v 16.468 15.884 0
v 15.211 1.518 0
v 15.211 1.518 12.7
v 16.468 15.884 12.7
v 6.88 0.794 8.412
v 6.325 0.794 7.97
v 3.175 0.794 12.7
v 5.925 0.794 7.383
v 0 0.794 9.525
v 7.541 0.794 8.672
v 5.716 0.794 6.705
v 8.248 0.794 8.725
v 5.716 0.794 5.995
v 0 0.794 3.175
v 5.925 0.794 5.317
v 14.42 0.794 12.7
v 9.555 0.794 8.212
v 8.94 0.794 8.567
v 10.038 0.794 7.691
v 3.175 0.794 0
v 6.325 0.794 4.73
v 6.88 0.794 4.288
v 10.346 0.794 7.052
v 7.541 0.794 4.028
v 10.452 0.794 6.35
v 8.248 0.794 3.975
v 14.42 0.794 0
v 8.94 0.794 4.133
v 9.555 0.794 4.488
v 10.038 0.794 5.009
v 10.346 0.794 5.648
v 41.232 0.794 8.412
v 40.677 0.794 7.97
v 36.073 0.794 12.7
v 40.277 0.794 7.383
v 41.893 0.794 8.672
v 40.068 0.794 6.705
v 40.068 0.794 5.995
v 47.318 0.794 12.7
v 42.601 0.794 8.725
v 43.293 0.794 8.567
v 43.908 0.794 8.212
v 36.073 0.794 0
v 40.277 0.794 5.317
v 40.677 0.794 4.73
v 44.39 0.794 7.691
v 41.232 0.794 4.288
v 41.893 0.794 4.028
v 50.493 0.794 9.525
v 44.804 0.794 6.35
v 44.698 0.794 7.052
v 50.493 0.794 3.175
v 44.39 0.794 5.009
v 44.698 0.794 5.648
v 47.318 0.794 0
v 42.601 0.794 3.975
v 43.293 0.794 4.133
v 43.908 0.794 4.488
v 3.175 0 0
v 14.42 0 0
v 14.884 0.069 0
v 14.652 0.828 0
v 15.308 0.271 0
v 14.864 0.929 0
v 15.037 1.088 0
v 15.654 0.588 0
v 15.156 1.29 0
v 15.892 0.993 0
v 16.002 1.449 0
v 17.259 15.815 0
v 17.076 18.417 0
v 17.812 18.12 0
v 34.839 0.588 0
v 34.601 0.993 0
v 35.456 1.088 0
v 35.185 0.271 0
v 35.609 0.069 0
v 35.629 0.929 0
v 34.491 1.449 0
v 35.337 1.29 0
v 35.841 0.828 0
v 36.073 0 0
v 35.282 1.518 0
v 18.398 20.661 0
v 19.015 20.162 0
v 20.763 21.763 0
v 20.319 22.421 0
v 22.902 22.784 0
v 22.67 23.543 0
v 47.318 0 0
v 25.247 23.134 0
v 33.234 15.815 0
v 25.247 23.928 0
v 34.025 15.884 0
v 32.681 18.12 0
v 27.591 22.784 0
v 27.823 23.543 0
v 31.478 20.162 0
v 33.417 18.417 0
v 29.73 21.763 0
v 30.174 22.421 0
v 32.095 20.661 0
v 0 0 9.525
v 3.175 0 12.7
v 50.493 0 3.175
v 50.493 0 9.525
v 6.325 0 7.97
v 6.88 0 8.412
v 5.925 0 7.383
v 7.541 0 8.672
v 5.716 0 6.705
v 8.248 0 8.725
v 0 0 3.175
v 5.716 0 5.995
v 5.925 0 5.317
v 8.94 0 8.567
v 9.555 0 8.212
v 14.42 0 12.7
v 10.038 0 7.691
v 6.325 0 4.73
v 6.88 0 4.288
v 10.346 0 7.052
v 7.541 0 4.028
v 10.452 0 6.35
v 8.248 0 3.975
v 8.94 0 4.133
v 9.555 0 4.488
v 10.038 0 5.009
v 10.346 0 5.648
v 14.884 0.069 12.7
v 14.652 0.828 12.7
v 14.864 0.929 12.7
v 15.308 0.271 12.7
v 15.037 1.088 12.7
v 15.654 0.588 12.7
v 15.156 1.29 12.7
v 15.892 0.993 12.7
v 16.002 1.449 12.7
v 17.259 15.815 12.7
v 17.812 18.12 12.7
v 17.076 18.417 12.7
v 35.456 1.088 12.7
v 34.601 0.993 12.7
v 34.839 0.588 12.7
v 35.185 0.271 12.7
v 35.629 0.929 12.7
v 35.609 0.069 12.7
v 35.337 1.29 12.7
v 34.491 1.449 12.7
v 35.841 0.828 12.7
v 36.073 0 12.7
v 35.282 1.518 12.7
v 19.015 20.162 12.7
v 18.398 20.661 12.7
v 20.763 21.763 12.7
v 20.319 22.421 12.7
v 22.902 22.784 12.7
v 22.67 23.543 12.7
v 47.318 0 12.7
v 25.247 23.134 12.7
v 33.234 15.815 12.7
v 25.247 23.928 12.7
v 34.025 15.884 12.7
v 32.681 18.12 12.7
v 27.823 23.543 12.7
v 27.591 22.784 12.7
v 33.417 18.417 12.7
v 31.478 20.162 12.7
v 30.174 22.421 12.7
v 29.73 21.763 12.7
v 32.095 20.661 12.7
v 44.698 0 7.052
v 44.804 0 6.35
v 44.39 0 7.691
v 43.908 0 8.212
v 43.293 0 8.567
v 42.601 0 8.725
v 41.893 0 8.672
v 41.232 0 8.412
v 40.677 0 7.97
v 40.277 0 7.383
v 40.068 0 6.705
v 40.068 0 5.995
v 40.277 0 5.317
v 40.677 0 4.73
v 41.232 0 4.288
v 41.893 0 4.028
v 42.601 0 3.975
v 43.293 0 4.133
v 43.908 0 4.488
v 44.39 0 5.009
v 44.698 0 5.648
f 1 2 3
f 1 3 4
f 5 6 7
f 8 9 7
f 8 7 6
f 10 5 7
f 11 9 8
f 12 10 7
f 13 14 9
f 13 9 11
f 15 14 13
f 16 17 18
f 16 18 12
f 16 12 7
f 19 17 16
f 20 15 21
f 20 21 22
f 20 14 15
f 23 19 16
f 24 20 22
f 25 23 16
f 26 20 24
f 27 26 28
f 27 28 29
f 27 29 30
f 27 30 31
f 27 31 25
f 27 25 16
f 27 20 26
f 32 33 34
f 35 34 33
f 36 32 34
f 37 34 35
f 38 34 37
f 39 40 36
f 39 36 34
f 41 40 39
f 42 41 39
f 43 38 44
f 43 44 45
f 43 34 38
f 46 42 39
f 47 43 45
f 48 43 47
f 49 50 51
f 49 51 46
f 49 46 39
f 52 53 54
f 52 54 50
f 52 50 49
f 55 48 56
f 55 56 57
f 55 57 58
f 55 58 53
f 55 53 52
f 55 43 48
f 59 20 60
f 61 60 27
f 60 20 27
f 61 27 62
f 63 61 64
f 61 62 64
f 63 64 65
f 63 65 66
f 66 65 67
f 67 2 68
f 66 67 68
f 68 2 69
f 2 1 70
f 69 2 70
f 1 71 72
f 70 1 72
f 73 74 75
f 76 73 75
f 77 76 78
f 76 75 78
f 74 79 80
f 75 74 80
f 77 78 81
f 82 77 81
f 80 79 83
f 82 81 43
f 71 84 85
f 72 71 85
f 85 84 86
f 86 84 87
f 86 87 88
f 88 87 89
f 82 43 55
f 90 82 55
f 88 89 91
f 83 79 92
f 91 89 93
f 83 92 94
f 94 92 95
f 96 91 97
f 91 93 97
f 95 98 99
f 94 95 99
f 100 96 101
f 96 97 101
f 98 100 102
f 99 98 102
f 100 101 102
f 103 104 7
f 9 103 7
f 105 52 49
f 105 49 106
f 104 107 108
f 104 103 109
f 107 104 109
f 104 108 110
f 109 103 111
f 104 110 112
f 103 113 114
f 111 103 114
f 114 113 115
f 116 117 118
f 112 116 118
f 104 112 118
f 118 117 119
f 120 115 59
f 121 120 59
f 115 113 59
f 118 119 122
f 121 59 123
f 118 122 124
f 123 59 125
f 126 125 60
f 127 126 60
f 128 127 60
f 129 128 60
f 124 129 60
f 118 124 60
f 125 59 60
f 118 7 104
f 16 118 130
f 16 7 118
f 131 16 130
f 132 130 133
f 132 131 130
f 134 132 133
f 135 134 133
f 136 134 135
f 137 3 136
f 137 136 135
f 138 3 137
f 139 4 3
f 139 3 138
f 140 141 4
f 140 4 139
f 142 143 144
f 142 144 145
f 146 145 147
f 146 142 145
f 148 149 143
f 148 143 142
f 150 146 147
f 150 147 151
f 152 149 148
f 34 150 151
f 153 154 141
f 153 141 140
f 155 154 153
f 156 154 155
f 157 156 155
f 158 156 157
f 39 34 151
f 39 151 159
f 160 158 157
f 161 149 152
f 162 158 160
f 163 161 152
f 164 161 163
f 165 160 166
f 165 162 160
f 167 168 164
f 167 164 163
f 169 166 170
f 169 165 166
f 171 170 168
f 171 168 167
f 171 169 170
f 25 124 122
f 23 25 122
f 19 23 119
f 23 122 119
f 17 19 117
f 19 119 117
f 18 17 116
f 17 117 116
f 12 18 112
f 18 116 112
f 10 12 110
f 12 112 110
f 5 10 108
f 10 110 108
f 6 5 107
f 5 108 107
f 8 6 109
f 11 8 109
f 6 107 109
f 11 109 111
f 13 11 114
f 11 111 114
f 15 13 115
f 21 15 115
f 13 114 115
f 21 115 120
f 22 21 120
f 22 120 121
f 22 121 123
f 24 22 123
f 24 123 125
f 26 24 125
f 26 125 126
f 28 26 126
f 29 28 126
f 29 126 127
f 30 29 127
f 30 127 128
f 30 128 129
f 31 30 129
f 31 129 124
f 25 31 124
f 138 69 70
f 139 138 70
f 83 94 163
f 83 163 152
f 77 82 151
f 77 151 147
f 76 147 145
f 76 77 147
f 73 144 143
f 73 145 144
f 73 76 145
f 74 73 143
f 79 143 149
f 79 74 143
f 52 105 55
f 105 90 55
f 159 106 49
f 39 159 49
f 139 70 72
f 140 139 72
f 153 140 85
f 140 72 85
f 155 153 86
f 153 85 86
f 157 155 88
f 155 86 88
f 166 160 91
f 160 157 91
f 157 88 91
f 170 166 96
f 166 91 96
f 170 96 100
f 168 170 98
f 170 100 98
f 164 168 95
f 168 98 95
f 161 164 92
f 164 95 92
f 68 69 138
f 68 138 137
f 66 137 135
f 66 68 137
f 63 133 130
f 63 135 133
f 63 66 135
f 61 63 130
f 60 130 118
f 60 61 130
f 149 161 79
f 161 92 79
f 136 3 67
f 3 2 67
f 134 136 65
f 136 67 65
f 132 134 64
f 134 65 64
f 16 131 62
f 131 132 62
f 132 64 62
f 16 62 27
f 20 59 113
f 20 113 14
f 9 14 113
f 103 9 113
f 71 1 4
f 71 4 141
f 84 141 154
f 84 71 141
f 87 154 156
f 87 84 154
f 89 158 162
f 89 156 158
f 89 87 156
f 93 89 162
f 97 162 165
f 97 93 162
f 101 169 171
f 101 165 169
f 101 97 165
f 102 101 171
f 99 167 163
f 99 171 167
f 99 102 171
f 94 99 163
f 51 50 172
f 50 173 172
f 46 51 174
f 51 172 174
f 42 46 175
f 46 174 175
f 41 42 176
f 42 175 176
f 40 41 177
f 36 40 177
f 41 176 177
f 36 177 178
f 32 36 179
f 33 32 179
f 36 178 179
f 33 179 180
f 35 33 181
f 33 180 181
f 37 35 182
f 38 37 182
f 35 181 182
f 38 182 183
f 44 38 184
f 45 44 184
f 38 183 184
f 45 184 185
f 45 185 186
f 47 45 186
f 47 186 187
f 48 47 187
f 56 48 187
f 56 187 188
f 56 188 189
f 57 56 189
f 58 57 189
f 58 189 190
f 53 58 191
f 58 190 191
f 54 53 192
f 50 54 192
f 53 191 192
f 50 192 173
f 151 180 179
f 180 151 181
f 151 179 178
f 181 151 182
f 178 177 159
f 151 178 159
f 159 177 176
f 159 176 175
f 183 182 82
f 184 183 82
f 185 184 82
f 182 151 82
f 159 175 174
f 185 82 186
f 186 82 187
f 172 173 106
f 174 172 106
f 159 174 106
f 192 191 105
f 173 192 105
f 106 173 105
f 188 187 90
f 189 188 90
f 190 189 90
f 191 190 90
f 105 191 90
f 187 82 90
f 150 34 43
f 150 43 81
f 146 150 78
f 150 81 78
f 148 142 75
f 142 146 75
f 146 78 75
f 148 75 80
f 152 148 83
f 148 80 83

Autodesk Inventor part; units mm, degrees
ref_plane "YZ Plane" through (0, 0, 0) normal (1, 0, 0) x (0, 1, 0)
ref_plane "XZ Plane" through (0, 0, 0) normal (0, 1, 0) x (-1, 0, 0)
ref_plane "XY Plane" through (0, 0, 0) normal (0, 0, 1) x (1, 0, 0)
sketch "Sketch1" plane through (0, 0, 0) normal (0, 0, 1) x (1, 0, 0)
  line L0 (0, 0) -> (14.4203, 0)
  line L1 (16.0018, 1.4491) -> (17.2586, 15.8146)
  arc A0 (33.2345, 15.8146) -> (17.2586, 15.8146) centre (25.2465, 15.1157) ccw
  line L2 (33.2345, 15.8146) -> (34.4913, 1.4491)
  line L3 (36.0728, 0) -> (50.4931, 0)
  arc A1 (14.4203, 0) -> (16.0018, 1.4491) centre (14.4203, 1.5875) ccw
  arc A2 (34.4913, 1.4491) -> (36.0728, 0) centre (36.0728, 1.5875) ccw
  line L4 (0, 0.7937) -> (14.4203, 0.7937)
  arc A3 (14.4203, 0.7937) -> (15.2111, 1.5183) centre (14.4203, 1.5875) ccw
  line L5 (15.2111, 1.5183) -> (16.4679, 15.8838)
  arc A4 (34.0252, 15.8838) -> (16.4679, 15.8838) centre (25.2465, 15.1157) ccw
  line L6 (34.0252, 15.8838) -> (35.282, 1.5183)
  arc A5 (35.282, 1.5183) -> (36.0728, 0.7938) centre (36.0728, 1.5875) ccw
  line L7 (36.0728, 0.7938) -> (50.4931, 0.7938)
  line L8 (0, 0.7937) -> (0, 0)
  line L9 (50.4931, 0.7938) -> (50.4931, 0)
  line L10 (17.944, 18.4277) -> (32.549, 18.4277) construction
  point P0 (15.875, 0)
  dimension "d0" = 15.875
  dimension "d1" = 15.875
  dimension "d2" = 1.5875
  dimension "d3" = 95
  dimension "d4" = 95
  dimension "d6" = 0.7937
  dimension "d18" = 14.605
  dimension "d19" = 18.4277
extrude "Extrusion1" add sketch "Sketch1" along normal blind 12.7
chamfer "Chamfer1" distance 3.175 angle 45 4 edges at (0, 0.3969, 12.7) (50.4931, 0.3969, 12.7) (50.4931, 0.3969, 0) (0, 0.3969, 0)
sketch "Sketch2" plane through (36.0728, 0, 0) normal (0, -1, 0) x (1, 0, 0)
  line L0 (0, 12.7) -> (11.2453, 12.7) projected
  line L1 (0, 0) -> (0, 12.7) projected
  line L2 (0, 0) -> (11.2453, 0) projected
  line L3 (-32.8978, 0) -> (-36.0728, 3.175) projected
  line L4 (-32.8978, 0) -> (-21.6524, 0) projected
  line L5 (-21.6524, 0) -> (-21.6524, 12.7) projected
  line L6 (-32.8978, 12.7) -> (-21.6524, 12.7) projected
  line L7 (-36.0728, 9.525) -> (-32.8978, 12.7) projected
  line L8 (-36.0728, 3.175) -> (-36.0728, 9.525) projected
  line L9 (6.35, 12.7) -> (6.35, 0) construction
  line L10 (-28.0024, 12.7) -> (-28.0024, 0) construction
  circle A0 centre (-28.0024, 6.35) radius 2.3813
  circle A1 centre (6.35, 6.35) radius 2.3813
  point P0 (-36.0728, 0)
  dimension "d12" = 4.7625
  dimension "d13" = 4.7625
  dimension "d14" = 6.35
  dimension "d15" = 6.35
extrude "Extrusion2" cut sketch "Sketch2" against normal through all contours A0 | A1
equation "\"d4\" = d3"
equation "\"d12\" = d13"
equation "\"d15\" = d14"
properties part number "Pneumatics Steel Bracket" material "Steel"
